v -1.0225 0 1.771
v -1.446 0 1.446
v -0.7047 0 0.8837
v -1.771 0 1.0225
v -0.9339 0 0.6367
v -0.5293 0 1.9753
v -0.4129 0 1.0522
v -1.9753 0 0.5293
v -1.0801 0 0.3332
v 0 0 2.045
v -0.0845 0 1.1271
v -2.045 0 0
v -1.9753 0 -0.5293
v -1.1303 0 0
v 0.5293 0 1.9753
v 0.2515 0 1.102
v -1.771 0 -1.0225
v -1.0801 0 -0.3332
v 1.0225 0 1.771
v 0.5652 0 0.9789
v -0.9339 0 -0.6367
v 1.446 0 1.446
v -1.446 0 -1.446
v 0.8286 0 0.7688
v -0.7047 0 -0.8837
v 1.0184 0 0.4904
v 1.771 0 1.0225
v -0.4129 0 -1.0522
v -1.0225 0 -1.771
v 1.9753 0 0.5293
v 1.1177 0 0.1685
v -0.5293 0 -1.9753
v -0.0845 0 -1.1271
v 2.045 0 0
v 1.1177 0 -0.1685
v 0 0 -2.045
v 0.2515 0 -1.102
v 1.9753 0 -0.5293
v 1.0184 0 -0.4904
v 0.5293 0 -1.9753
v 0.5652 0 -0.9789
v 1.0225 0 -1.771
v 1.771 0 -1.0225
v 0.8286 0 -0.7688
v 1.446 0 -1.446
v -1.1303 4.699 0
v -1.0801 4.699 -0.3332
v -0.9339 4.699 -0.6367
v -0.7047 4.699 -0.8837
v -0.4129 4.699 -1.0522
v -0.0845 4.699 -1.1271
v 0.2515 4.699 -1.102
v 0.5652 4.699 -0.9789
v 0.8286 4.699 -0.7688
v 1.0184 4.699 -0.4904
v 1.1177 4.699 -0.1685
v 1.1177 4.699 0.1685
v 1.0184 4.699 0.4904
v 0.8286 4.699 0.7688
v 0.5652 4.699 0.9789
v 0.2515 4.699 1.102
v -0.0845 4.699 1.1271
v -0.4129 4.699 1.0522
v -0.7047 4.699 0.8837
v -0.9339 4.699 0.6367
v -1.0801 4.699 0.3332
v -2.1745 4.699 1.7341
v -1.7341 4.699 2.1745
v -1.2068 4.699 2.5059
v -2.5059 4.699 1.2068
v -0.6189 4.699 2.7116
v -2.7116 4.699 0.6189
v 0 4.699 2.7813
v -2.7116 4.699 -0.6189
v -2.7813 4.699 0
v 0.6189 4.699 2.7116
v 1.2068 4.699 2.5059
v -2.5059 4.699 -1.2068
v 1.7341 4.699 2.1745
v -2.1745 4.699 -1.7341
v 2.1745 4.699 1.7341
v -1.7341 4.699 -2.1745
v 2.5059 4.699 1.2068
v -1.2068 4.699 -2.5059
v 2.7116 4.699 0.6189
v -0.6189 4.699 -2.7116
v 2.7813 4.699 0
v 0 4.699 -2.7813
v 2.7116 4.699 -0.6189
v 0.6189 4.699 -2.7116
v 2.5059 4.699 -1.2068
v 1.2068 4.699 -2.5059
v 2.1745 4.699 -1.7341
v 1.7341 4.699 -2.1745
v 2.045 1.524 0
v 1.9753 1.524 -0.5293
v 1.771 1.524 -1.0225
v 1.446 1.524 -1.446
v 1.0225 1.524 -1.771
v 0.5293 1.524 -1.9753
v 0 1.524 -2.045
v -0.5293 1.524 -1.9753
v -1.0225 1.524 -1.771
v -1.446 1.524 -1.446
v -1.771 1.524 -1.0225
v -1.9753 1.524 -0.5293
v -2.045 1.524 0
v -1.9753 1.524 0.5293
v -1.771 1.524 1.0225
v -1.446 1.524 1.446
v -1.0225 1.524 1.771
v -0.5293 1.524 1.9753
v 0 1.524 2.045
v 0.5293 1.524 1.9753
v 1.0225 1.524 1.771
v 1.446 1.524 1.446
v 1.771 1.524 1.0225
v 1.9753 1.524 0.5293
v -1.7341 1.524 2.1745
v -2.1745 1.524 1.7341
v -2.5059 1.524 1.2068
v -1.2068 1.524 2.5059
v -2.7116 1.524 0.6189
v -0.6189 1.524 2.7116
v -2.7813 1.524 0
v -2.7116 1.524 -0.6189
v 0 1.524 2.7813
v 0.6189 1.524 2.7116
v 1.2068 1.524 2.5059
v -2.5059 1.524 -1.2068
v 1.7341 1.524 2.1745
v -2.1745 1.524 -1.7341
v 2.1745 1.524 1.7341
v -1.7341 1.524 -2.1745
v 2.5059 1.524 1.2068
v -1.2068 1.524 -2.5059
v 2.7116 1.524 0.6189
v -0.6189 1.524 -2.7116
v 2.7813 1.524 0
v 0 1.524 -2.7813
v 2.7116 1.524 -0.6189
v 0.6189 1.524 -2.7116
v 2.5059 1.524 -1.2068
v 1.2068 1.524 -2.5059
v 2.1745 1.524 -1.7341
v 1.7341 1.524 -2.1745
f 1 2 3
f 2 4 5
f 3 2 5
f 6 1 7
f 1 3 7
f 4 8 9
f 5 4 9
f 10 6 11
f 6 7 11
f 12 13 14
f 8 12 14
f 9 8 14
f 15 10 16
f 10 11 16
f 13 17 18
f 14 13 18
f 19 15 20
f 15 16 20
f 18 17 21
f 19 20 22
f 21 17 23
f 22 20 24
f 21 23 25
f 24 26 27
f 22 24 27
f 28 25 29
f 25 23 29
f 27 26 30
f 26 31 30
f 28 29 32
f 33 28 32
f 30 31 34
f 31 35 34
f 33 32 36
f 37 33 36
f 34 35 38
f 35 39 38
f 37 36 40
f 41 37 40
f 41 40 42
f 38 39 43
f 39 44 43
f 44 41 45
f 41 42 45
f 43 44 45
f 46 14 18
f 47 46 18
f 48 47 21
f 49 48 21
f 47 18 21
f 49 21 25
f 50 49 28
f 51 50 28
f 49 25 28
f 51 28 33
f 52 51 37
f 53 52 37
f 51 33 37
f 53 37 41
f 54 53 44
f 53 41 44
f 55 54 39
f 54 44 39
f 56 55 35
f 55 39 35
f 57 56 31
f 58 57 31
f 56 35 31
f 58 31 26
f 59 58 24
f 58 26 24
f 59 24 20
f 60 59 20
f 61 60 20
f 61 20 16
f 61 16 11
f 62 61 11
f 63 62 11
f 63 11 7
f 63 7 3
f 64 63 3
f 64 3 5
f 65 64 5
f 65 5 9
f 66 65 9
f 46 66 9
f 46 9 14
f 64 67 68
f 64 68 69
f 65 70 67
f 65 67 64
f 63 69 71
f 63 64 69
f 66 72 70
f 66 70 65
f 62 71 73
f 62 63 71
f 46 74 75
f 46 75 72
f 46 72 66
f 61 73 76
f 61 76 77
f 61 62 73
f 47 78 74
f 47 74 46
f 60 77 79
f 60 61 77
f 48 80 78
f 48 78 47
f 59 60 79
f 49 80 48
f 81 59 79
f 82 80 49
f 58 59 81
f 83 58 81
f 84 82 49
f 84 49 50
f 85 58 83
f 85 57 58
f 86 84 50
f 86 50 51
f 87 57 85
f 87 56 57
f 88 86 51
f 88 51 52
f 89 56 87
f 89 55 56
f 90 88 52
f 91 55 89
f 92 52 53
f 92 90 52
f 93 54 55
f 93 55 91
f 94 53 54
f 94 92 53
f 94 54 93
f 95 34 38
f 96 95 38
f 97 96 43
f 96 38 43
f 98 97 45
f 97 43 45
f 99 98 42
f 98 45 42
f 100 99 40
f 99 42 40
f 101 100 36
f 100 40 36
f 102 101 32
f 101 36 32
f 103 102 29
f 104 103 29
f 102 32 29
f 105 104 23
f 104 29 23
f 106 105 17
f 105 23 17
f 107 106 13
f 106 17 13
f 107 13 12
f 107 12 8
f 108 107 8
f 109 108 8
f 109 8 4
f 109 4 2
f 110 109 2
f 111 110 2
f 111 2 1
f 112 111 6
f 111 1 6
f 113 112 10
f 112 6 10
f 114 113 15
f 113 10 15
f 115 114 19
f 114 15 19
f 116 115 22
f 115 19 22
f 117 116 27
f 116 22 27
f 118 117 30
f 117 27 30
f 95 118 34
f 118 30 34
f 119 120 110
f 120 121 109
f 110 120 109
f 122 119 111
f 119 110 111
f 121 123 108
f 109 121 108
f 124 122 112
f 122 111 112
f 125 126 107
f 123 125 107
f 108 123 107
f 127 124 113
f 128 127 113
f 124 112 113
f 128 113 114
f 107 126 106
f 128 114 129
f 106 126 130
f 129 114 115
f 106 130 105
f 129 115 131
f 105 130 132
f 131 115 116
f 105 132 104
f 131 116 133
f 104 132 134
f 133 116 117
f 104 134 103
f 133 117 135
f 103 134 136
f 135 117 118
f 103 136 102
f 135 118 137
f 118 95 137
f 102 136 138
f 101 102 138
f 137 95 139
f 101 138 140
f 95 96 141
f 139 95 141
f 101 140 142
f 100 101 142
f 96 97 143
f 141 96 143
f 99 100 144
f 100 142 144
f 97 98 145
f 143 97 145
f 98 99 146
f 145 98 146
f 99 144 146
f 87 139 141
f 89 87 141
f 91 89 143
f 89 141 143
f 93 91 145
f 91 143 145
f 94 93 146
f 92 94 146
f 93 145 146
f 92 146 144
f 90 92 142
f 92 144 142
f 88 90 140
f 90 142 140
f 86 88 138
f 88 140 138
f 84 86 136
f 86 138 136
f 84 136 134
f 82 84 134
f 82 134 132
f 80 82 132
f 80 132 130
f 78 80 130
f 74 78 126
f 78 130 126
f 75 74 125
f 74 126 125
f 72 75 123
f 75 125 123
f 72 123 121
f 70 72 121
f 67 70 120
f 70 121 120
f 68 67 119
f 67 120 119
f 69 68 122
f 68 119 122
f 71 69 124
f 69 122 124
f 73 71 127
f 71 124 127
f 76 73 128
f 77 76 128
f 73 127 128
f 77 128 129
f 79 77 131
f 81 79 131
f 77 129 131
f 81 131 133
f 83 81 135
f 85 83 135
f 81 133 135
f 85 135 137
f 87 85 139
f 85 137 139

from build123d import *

# Parameters (mm, degrees)
SKETCH1_R                 = 2.045
BOSS_EXTRUDE1_DEPTH       = 1.524
SKETCH2_R                 = 2.7813
BOSS_EXTRUDE2_DEPTH       = 3.175
F_4_40_TAPPED_HOLE1_D     = 2.2606
F_4_40_TAPPED_HOLE1_DEPTH = 7.62
F_4_40_TAPPED_HOLE1_TIP   = 0.679152758


with BuildPart() as part:
    # Sketch1 → Boss-Extrude1 (new body)
    with BuildSketch(Plane(origin=(0, 0, 0), x_dir=(1, 0, 0), z_dir=(0, 1, 0))):
        Circle(SKETCH1_R)
    extrude(amount=BOSS_EXTRUDE1_DEPTH)

    # Sketch2 → Boss-Extrude2 (add)
    with BuildSketch(Plane(origin=(0, 1.524, 0), x_dir=(1, 0, 0), z_dir=(0, 1, 0))):
        Circle(SKETCH2_R)
    extrude(amount=BOSS_EXTRUDE2_DEPTH)

    # #4-40 Tapped Hole1
    with Locations(Plane(origin=(0, 4.699, 0), x_dir=(1, 0, 0), z_dir=(0, 1, 0))):
        with Locations((0, 0)):
            Hole(F_4_40_TAPPED_HOLE1_D / 2, depth=F_4_40_TAPPED_HOLE1_DEPTH)
            with Locations((0, 0, -(F_4_40_TAPPED_HOLE1_DEPTH + F_4_40_TAPPED_HOLE1_TIP / 2))):  # 118° drill point
                Cone(0, F_4_40_TAPPED_HOLE1_D / 2, F_4_40_TAPPED_HOLE1_TIP, mode=Mode.SUBTRACT)


solid = part.part
